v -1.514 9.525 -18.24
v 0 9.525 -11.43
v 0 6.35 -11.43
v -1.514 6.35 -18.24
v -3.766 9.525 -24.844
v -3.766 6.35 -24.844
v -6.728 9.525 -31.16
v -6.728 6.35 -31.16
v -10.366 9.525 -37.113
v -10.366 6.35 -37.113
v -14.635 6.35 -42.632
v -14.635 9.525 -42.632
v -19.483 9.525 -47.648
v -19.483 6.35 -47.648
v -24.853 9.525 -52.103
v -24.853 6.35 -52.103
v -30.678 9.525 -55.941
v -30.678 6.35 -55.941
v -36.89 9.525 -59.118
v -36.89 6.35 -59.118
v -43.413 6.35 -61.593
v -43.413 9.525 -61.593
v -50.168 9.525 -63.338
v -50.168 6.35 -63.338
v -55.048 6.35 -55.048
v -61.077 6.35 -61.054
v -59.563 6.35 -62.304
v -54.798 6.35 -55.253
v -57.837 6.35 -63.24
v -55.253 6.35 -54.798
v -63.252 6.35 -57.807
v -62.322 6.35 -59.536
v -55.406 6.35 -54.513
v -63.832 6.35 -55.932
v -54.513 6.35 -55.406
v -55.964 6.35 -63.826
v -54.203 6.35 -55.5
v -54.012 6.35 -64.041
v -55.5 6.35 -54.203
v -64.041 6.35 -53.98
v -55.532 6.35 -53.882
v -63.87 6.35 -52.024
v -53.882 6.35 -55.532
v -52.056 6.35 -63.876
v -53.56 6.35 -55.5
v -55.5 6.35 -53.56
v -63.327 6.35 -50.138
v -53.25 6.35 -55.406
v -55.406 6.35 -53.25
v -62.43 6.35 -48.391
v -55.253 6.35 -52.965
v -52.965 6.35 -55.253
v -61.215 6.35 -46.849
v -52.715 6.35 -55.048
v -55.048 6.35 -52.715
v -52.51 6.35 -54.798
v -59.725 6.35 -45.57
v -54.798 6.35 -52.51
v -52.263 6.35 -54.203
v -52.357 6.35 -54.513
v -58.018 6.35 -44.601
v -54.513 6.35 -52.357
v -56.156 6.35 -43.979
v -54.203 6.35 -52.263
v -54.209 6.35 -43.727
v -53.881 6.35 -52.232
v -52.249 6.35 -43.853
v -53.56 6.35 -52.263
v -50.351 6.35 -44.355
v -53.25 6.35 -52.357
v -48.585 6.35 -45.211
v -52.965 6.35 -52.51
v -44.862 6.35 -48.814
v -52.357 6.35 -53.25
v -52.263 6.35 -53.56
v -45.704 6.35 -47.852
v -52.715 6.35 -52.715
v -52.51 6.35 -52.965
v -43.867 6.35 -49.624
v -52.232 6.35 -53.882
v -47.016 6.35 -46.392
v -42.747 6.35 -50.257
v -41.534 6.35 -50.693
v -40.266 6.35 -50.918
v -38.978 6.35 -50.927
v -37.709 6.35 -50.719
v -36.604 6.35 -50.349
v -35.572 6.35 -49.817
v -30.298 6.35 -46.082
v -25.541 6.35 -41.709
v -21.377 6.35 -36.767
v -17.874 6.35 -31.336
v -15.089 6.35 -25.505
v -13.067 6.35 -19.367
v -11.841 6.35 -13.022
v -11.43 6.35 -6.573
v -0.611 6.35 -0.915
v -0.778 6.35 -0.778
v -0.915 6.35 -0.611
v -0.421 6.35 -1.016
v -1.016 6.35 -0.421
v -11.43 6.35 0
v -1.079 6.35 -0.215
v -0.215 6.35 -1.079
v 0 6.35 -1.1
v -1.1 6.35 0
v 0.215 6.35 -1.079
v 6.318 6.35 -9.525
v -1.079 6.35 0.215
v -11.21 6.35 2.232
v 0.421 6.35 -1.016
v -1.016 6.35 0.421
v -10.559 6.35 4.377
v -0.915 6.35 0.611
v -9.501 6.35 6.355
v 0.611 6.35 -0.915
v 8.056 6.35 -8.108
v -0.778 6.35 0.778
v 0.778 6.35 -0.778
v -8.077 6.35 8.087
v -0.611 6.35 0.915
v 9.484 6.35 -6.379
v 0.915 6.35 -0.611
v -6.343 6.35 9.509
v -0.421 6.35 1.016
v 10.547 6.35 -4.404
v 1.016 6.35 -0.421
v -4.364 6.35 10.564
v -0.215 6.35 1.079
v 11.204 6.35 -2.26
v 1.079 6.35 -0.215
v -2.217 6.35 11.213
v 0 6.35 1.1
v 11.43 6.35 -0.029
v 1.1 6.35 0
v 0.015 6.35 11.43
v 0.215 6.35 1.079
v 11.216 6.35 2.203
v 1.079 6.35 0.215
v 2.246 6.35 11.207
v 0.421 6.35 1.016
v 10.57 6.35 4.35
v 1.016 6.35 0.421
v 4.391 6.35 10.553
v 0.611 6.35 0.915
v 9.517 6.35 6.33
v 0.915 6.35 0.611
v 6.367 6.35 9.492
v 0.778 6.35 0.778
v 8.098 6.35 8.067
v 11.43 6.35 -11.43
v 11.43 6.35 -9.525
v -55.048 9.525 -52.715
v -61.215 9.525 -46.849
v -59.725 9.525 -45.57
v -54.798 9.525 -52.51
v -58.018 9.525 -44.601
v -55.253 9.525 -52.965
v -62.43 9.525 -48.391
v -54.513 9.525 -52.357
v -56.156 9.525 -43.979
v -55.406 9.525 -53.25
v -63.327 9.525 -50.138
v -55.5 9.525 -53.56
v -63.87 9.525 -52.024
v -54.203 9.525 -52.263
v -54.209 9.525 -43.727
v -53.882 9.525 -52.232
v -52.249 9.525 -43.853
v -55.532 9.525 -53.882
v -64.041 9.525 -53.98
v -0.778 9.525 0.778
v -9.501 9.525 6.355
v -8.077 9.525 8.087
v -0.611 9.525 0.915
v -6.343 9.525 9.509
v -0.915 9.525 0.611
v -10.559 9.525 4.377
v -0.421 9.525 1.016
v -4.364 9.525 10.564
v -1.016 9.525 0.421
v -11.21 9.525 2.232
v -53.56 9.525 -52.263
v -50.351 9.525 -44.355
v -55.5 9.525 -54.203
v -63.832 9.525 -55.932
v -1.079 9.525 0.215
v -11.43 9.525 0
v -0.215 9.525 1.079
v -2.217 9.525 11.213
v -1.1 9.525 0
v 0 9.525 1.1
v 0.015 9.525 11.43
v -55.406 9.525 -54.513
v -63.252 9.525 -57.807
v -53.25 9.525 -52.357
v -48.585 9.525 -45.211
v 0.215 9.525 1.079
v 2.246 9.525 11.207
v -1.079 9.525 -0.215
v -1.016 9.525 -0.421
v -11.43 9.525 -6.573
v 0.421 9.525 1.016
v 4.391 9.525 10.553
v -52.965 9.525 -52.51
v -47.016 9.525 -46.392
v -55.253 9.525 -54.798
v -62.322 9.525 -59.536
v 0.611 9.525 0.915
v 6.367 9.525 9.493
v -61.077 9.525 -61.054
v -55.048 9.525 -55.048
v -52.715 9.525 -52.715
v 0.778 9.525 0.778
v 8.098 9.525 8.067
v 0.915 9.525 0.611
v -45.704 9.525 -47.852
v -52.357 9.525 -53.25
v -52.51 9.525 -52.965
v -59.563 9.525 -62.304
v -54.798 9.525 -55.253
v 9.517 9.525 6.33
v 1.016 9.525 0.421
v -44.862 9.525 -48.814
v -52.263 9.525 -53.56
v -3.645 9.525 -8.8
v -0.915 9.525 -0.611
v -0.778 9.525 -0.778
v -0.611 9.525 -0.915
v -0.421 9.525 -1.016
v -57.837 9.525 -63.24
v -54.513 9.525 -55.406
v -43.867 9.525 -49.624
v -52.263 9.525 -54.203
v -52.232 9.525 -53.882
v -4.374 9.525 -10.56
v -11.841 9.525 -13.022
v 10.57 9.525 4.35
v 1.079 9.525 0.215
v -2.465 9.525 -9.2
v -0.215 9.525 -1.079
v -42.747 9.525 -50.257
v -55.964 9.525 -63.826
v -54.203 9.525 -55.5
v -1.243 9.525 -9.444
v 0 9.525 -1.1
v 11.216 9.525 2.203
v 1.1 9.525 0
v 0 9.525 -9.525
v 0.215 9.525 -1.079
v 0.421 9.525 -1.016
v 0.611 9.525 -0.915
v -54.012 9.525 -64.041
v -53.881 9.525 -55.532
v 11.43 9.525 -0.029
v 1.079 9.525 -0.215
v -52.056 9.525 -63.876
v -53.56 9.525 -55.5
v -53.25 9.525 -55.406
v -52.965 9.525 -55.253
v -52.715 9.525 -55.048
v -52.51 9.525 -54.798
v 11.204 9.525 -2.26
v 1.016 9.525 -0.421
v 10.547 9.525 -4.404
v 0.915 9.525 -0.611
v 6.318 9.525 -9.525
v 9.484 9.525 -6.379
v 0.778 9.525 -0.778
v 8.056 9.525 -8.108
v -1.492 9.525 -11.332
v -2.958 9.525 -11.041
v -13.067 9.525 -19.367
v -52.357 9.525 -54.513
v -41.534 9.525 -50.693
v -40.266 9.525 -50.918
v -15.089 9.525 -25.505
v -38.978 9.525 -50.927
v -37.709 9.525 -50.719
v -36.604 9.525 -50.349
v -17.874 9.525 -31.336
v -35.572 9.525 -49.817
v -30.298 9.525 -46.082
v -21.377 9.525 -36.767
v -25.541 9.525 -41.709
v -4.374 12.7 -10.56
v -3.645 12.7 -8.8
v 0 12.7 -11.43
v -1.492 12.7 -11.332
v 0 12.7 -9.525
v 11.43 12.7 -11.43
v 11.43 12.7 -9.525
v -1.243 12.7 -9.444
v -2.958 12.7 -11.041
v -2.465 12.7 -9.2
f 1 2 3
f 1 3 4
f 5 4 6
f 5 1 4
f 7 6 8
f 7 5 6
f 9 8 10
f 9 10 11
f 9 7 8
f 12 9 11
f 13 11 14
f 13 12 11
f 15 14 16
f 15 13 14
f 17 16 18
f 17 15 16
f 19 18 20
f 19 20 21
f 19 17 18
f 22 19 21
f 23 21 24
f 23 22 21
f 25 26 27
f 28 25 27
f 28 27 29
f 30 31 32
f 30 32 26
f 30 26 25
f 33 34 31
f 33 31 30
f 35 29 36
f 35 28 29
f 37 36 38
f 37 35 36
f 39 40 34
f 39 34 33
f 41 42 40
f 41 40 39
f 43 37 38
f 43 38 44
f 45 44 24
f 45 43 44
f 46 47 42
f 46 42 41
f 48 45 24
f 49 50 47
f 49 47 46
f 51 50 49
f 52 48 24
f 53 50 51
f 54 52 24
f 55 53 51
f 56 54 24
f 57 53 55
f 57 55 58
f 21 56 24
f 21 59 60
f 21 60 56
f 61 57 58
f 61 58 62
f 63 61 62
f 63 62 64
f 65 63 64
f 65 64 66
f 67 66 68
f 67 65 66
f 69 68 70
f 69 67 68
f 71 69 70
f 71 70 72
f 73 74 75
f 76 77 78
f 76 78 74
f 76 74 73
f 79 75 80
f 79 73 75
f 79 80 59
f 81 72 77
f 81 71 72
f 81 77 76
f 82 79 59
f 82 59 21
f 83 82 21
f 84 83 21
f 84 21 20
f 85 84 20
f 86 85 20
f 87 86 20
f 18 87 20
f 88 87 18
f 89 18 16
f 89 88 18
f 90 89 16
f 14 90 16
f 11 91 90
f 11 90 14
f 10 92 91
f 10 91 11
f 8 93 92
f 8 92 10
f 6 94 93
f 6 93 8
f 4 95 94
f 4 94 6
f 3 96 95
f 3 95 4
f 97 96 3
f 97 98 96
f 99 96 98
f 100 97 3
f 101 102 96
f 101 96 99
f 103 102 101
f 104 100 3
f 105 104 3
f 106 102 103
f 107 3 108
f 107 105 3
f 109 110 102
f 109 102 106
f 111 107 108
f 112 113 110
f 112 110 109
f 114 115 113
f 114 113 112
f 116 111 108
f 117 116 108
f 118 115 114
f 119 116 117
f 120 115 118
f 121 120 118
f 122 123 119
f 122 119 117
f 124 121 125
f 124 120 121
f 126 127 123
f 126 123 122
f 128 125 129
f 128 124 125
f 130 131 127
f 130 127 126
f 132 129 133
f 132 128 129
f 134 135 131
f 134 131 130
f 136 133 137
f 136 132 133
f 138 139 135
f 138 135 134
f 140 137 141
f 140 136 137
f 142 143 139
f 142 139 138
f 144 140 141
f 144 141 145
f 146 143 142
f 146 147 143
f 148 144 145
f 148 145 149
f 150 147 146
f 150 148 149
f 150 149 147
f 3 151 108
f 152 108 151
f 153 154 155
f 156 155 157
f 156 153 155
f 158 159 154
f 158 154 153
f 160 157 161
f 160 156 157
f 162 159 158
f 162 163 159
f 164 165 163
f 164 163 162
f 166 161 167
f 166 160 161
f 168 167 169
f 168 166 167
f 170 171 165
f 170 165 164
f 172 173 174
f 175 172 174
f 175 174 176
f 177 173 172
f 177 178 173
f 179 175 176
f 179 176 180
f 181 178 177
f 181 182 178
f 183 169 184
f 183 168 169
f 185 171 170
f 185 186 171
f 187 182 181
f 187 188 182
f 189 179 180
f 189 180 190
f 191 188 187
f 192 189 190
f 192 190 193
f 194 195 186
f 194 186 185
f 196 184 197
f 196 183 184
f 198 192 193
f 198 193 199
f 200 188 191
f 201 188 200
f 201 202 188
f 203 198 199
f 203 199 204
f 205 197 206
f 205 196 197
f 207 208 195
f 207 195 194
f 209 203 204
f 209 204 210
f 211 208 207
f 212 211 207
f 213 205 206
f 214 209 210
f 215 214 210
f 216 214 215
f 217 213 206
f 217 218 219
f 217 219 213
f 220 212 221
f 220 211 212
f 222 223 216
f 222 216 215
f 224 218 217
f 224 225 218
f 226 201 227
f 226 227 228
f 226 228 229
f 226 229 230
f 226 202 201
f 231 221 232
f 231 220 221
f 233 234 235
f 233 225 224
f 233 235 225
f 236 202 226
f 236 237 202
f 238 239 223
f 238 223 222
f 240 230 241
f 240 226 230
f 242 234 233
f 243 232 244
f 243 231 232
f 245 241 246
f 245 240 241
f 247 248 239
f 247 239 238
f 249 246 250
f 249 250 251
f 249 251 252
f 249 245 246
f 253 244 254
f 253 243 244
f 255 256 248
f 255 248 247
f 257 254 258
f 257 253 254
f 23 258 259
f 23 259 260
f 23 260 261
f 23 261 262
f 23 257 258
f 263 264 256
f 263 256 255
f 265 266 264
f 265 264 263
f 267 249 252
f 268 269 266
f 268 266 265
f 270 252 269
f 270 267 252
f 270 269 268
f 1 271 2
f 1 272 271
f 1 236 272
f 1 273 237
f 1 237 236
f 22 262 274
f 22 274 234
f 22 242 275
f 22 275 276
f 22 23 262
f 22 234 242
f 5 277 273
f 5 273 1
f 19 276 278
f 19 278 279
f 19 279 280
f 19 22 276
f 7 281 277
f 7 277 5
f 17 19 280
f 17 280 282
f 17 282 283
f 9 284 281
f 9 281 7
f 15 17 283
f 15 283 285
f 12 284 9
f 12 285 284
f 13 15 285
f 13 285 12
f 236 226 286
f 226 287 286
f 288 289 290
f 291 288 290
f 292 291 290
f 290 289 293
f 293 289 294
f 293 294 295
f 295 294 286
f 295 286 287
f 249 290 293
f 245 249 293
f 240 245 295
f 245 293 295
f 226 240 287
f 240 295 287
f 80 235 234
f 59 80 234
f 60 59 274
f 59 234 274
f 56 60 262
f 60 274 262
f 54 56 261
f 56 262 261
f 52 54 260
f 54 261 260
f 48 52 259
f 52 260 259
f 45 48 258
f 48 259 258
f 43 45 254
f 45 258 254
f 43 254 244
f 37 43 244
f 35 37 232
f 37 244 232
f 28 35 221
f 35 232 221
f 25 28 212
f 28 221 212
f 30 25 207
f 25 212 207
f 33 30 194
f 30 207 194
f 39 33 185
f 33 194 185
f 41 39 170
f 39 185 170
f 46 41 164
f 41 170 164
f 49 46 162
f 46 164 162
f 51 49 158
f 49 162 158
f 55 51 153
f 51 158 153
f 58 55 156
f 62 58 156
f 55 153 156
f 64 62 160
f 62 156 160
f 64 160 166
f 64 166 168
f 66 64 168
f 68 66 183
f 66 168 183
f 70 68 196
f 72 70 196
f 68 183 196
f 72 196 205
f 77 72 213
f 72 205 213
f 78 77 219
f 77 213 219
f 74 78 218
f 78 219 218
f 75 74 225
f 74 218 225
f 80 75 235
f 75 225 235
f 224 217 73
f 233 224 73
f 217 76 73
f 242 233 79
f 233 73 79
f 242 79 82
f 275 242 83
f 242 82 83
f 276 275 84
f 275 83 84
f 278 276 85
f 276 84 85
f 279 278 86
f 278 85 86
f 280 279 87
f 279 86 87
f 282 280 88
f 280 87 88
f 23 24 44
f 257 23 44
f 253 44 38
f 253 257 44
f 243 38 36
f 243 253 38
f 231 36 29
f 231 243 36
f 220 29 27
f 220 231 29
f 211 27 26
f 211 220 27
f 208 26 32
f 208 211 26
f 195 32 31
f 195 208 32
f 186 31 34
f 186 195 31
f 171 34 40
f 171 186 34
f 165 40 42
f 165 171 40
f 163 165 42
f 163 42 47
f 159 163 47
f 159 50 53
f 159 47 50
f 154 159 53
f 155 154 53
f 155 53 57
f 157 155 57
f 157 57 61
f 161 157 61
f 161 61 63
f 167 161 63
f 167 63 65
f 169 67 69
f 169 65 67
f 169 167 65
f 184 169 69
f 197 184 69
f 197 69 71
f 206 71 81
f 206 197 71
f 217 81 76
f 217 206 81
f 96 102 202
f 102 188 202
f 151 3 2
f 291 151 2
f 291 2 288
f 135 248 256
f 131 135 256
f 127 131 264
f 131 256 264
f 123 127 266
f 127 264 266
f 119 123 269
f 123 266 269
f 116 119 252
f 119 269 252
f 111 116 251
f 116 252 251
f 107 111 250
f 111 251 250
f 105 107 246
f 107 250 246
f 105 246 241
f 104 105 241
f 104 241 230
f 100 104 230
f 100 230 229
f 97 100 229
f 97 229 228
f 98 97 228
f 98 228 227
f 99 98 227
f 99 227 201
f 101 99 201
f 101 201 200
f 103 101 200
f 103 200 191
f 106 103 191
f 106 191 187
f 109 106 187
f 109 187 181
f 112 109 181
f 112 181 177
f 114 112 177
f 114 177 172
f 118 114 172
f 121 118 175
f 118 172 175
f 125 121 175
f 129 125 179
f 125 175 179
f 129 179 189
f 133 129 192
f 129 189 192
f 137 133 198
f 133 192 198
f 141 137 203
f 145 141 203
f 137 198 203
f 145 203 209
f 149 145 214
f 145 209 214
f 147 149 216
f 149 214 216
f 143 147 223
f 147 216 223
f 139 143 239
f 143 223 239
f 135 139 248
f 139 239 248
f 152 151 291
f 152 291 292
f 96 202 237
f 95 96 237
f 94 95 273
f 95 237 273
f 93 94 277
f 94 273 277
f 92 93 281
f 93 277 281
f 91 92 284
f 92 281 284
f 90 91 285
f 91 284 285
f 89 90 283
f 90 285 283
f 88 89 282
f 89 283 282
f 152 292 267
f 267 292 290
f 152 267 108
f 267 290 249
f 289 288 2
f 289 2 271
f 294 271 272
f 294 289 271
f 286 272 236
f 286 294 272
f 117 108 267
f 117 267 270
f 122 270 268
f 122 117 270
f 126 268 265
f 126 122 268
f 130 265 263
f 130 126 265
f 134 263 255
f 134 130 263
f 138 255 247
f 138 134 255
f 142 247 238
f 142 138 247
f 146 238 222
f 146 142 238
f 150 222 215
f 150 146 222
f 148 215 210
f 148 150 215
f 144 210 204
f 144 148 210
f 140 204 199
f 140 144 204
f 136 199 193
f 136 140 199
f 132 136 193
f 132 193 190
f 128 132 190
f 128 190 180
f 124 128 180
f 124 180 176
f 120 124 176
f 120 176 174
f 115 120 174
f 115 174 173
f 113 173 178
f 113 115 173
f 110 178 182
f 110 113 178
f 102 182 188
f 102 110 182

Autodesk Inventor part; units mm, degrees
ref_plane "YZ Plane" through (0, 0, 0) normal (1, 0, 0) x (0, 1, 0)
ref_plane "XZ Plane" through (0, 0, 0) normal (0, 1, 0) x (-1, 0, 0)
ref_plane "XY Plane" through (0, 0, 0) normal (0, 0, 1) x (1, 0, 0)
sketch "Sketch1" plane through (0, 0, 0) normal (0, 1, 0) x (-1, 0, 0)
  circle A0 centre (0, 0) radius 11.43
  circle A1 centre (0, 0) radius 9.525
  dimension "d0" = 22.86
  dimension "d1" = 19.05
extrude "Extrusion1" add sketch "Sketch1" along normal blind 6.35
sketch "Sketch2" plane through (0, 6.35, 0) normal (0, 1, 0) x (1, 0, 0)
  circle A0 centre (0, 0) radius 11.43
extrude "Extrusion2" add sketch "Sketch2" along normal blind 3.175
sketch "Sketch3" plane through (0, 9.525, 0) normal (0, 1, 0) x (1, 0, 0)
  circle A0 centre (0, 0) radius 1.1
  dimension "d6" = 2.2
extrude "Extrusion3" cut sketch "Sketch3" against normal blind 7.9375
sketch "Sketch6" plane through (0, 0, 0) normal (0, -1, 0) x (1, 0, 0)
  line L0 (-16.0948, 0) -> (0, 0)
  line L1 (0, 0) -> (0, -15.3841)
  line L2 (0, -15.3841) -> (-16.0948, -15.3841)
  line L3 (-16.0948, -15.3841) -> (-16.0948, 0)
  line L4 (-16.0948, 14.6504) -> (12.3807, 14.6504)
  line L5 (12.3807, 14.6504) -> (12.3807, -15.3841)
  line L6 (12.3807, -15.3841) -> (-16.0948, -15.3841)
  line L7 (-16.0948, -15.3841) -> (-16.0948, 14.6504)
extrude "Extrusion6" cut sketch "Sketch6" against normal blind 6.35 contours L7 L4 L5 L6 L1 L0
sketch "Sketch7" plane through (0, 0, -9.525) normal (1, 0, 0) x (0, 0, -1)
  line L0 (1.905, 6.35) -> (-20.955, 6.35) projected
  line L1 (1.905, 6.35) -> (0, 6.35)
  line L2 (0, 6.35) -> (0, 0)
  line L3 (0, 0) -> (1.905, 0)
  line L4 (1.905, 0) -> (1.905, 6.35)
  point P0 (-9.525, 0)
  point P1 (-9.525, 6.35)
extrude "Extrusion7" add sketch "Sketch7" along normal blind 11.43
sketch "Sketch8" plane through (0, 0, 0) normal (0, -1, 0) x (1, 0, 0)
  line L0 (0, 0) -> (-10.5625, -10.5625)
  line L1 (0, 0) -> (14.9376, 0) construction
  line L2 (-10.5625, -10.5625) -> (-17.6997, 3.3244)
  line L3 (-17.6997, 3.3244) -> (0, 0)
  dimension "d18" = 135
extrude "Extrusion8" cut sketch "Sketch8" against normal blind 6.35
sketch "Sketch9" plane through (0, 0, 0) normal (0, -1, 0) x (1, 0, 0)
  line L0 (0, 0) -> (-6.0166, -14.5254)
  line L1 (0, 0) -> (15.7222, 0) construction
  line L2 (-6.0166, -14.5254) -> (-13.1372, -7.2627)
  line L3 (-13.1372, -7.2627) -> (0, 0)
  dimension "d21" = 112.5
extrude "Extrusion9" cut sketch "Sketch9" against normal blind 6.35
sketch "Sketch13" plane through (0, 9.525, 0) normal (0, 1, 0) x (1, 0, 0)
  line L0 (0, 0) -> (-53.8815, 53.8815)
  line L1 (0, 0) -> (76.2, 0) construction
  circle A0 centre (-53.8815, 53.8815) radius 10.16
  arc A1 (6.3182, 9.525) -> (0, 11.43) centre (0, 0) ccw projected
  line L2 (0, 11.43) -> (0, 53.8815)
  line L3 (0, 53.8815) -> (-50.1886, 63.3466)
  arc A2 (-4.3741, 10.5599) -> (6.3182, 9.525) centre (0, 0) ccw projected
  line L4 (-11.43, 0) -> (-11.43, 42.4515)
  line L5 (-11.43, 42.4515) -> (-43.7215, 53.8815)
  circle A3 centre (-53.8815, 53.8815) radius 1.65
  circle A4 centre (0, 0) radius 1.1 projected
  circle A5 centre (0, 0) radius 1.65
  dimension "d44" = 76.2
  dimension "d45" = 135
  dimension "d46" = 20.32
  dimension "d47" = 100.68
  dimension "d48" = 3.3
  dimension "d49" = 3.3
extrude "Extrusion13" add sketch "Sketch13" against normal blind 3.175 contours A2 L4 L0 | L0 L4 L5 A0 L3 L2 A1 A2 | A0
fillet "Fillet3" radius 50.8 1 edges at (-11.43, 7.9375, -42.4515)
fillet "Fillet4" radius 7.62 1 edges at (-43.7215, 7.9375, -53.8815)
fillet "Fillet5" radius 63.5 1 edges at (0, 7.9375, -53.8815)
mirror "Mirror1" about plane through (0, 6.35, -11.43) normal (0, 1, 0) of "Extrusion1", "Extrusion7"
sketch "Sketch14" plane through (0, 12.7, -11.43) normal (0, 1, 0) x (1, 0, 0)
  line L0 (0, -11.43) -> (-4.3741, -0.8701)
  line L1 (-4.3741, -0.8701) -> (-16.9777, -0.8701)
  line L2 (-16.9777, -0.8701) -> (-16.9777, -27.9599)
  line L3 (-16.9777, -27.9599) -> (23.6628, -27.9599)
  line L4 (0, -1.905) -> (11.43, -1.905) projected
  line L5 (23.6628, -27.9599) -> (11.43, -1.905)
  line L6 (11.43, -1.905) -> (0, -1.905)
  line L7 (0, -1.905) -> (0, -11.43)
extrude "Extrusion14" cut sketch "Sketch14" against normal blind 3.175
sketch "Sketch15" plane through (0, 6.35, 0) normal (0, -1, 0) x (1, 0, 0)
  line L0 (-24.6585, 25.4032) -> (37.4015, 25.4032)
  line L1 (37.4015, 25.4032) -> (37.4015, -39.3047)
  line L2 (37.4015, -39.3047) -> (-24.6585, -39.3047)
  line L3 (-24.6585, -39.3047) -> (-24.6585, 25.4032)
  point P0 (0, 0)
extrude "Extrusion15" cut sketch "Sketch15" along normal blind 26.9875
